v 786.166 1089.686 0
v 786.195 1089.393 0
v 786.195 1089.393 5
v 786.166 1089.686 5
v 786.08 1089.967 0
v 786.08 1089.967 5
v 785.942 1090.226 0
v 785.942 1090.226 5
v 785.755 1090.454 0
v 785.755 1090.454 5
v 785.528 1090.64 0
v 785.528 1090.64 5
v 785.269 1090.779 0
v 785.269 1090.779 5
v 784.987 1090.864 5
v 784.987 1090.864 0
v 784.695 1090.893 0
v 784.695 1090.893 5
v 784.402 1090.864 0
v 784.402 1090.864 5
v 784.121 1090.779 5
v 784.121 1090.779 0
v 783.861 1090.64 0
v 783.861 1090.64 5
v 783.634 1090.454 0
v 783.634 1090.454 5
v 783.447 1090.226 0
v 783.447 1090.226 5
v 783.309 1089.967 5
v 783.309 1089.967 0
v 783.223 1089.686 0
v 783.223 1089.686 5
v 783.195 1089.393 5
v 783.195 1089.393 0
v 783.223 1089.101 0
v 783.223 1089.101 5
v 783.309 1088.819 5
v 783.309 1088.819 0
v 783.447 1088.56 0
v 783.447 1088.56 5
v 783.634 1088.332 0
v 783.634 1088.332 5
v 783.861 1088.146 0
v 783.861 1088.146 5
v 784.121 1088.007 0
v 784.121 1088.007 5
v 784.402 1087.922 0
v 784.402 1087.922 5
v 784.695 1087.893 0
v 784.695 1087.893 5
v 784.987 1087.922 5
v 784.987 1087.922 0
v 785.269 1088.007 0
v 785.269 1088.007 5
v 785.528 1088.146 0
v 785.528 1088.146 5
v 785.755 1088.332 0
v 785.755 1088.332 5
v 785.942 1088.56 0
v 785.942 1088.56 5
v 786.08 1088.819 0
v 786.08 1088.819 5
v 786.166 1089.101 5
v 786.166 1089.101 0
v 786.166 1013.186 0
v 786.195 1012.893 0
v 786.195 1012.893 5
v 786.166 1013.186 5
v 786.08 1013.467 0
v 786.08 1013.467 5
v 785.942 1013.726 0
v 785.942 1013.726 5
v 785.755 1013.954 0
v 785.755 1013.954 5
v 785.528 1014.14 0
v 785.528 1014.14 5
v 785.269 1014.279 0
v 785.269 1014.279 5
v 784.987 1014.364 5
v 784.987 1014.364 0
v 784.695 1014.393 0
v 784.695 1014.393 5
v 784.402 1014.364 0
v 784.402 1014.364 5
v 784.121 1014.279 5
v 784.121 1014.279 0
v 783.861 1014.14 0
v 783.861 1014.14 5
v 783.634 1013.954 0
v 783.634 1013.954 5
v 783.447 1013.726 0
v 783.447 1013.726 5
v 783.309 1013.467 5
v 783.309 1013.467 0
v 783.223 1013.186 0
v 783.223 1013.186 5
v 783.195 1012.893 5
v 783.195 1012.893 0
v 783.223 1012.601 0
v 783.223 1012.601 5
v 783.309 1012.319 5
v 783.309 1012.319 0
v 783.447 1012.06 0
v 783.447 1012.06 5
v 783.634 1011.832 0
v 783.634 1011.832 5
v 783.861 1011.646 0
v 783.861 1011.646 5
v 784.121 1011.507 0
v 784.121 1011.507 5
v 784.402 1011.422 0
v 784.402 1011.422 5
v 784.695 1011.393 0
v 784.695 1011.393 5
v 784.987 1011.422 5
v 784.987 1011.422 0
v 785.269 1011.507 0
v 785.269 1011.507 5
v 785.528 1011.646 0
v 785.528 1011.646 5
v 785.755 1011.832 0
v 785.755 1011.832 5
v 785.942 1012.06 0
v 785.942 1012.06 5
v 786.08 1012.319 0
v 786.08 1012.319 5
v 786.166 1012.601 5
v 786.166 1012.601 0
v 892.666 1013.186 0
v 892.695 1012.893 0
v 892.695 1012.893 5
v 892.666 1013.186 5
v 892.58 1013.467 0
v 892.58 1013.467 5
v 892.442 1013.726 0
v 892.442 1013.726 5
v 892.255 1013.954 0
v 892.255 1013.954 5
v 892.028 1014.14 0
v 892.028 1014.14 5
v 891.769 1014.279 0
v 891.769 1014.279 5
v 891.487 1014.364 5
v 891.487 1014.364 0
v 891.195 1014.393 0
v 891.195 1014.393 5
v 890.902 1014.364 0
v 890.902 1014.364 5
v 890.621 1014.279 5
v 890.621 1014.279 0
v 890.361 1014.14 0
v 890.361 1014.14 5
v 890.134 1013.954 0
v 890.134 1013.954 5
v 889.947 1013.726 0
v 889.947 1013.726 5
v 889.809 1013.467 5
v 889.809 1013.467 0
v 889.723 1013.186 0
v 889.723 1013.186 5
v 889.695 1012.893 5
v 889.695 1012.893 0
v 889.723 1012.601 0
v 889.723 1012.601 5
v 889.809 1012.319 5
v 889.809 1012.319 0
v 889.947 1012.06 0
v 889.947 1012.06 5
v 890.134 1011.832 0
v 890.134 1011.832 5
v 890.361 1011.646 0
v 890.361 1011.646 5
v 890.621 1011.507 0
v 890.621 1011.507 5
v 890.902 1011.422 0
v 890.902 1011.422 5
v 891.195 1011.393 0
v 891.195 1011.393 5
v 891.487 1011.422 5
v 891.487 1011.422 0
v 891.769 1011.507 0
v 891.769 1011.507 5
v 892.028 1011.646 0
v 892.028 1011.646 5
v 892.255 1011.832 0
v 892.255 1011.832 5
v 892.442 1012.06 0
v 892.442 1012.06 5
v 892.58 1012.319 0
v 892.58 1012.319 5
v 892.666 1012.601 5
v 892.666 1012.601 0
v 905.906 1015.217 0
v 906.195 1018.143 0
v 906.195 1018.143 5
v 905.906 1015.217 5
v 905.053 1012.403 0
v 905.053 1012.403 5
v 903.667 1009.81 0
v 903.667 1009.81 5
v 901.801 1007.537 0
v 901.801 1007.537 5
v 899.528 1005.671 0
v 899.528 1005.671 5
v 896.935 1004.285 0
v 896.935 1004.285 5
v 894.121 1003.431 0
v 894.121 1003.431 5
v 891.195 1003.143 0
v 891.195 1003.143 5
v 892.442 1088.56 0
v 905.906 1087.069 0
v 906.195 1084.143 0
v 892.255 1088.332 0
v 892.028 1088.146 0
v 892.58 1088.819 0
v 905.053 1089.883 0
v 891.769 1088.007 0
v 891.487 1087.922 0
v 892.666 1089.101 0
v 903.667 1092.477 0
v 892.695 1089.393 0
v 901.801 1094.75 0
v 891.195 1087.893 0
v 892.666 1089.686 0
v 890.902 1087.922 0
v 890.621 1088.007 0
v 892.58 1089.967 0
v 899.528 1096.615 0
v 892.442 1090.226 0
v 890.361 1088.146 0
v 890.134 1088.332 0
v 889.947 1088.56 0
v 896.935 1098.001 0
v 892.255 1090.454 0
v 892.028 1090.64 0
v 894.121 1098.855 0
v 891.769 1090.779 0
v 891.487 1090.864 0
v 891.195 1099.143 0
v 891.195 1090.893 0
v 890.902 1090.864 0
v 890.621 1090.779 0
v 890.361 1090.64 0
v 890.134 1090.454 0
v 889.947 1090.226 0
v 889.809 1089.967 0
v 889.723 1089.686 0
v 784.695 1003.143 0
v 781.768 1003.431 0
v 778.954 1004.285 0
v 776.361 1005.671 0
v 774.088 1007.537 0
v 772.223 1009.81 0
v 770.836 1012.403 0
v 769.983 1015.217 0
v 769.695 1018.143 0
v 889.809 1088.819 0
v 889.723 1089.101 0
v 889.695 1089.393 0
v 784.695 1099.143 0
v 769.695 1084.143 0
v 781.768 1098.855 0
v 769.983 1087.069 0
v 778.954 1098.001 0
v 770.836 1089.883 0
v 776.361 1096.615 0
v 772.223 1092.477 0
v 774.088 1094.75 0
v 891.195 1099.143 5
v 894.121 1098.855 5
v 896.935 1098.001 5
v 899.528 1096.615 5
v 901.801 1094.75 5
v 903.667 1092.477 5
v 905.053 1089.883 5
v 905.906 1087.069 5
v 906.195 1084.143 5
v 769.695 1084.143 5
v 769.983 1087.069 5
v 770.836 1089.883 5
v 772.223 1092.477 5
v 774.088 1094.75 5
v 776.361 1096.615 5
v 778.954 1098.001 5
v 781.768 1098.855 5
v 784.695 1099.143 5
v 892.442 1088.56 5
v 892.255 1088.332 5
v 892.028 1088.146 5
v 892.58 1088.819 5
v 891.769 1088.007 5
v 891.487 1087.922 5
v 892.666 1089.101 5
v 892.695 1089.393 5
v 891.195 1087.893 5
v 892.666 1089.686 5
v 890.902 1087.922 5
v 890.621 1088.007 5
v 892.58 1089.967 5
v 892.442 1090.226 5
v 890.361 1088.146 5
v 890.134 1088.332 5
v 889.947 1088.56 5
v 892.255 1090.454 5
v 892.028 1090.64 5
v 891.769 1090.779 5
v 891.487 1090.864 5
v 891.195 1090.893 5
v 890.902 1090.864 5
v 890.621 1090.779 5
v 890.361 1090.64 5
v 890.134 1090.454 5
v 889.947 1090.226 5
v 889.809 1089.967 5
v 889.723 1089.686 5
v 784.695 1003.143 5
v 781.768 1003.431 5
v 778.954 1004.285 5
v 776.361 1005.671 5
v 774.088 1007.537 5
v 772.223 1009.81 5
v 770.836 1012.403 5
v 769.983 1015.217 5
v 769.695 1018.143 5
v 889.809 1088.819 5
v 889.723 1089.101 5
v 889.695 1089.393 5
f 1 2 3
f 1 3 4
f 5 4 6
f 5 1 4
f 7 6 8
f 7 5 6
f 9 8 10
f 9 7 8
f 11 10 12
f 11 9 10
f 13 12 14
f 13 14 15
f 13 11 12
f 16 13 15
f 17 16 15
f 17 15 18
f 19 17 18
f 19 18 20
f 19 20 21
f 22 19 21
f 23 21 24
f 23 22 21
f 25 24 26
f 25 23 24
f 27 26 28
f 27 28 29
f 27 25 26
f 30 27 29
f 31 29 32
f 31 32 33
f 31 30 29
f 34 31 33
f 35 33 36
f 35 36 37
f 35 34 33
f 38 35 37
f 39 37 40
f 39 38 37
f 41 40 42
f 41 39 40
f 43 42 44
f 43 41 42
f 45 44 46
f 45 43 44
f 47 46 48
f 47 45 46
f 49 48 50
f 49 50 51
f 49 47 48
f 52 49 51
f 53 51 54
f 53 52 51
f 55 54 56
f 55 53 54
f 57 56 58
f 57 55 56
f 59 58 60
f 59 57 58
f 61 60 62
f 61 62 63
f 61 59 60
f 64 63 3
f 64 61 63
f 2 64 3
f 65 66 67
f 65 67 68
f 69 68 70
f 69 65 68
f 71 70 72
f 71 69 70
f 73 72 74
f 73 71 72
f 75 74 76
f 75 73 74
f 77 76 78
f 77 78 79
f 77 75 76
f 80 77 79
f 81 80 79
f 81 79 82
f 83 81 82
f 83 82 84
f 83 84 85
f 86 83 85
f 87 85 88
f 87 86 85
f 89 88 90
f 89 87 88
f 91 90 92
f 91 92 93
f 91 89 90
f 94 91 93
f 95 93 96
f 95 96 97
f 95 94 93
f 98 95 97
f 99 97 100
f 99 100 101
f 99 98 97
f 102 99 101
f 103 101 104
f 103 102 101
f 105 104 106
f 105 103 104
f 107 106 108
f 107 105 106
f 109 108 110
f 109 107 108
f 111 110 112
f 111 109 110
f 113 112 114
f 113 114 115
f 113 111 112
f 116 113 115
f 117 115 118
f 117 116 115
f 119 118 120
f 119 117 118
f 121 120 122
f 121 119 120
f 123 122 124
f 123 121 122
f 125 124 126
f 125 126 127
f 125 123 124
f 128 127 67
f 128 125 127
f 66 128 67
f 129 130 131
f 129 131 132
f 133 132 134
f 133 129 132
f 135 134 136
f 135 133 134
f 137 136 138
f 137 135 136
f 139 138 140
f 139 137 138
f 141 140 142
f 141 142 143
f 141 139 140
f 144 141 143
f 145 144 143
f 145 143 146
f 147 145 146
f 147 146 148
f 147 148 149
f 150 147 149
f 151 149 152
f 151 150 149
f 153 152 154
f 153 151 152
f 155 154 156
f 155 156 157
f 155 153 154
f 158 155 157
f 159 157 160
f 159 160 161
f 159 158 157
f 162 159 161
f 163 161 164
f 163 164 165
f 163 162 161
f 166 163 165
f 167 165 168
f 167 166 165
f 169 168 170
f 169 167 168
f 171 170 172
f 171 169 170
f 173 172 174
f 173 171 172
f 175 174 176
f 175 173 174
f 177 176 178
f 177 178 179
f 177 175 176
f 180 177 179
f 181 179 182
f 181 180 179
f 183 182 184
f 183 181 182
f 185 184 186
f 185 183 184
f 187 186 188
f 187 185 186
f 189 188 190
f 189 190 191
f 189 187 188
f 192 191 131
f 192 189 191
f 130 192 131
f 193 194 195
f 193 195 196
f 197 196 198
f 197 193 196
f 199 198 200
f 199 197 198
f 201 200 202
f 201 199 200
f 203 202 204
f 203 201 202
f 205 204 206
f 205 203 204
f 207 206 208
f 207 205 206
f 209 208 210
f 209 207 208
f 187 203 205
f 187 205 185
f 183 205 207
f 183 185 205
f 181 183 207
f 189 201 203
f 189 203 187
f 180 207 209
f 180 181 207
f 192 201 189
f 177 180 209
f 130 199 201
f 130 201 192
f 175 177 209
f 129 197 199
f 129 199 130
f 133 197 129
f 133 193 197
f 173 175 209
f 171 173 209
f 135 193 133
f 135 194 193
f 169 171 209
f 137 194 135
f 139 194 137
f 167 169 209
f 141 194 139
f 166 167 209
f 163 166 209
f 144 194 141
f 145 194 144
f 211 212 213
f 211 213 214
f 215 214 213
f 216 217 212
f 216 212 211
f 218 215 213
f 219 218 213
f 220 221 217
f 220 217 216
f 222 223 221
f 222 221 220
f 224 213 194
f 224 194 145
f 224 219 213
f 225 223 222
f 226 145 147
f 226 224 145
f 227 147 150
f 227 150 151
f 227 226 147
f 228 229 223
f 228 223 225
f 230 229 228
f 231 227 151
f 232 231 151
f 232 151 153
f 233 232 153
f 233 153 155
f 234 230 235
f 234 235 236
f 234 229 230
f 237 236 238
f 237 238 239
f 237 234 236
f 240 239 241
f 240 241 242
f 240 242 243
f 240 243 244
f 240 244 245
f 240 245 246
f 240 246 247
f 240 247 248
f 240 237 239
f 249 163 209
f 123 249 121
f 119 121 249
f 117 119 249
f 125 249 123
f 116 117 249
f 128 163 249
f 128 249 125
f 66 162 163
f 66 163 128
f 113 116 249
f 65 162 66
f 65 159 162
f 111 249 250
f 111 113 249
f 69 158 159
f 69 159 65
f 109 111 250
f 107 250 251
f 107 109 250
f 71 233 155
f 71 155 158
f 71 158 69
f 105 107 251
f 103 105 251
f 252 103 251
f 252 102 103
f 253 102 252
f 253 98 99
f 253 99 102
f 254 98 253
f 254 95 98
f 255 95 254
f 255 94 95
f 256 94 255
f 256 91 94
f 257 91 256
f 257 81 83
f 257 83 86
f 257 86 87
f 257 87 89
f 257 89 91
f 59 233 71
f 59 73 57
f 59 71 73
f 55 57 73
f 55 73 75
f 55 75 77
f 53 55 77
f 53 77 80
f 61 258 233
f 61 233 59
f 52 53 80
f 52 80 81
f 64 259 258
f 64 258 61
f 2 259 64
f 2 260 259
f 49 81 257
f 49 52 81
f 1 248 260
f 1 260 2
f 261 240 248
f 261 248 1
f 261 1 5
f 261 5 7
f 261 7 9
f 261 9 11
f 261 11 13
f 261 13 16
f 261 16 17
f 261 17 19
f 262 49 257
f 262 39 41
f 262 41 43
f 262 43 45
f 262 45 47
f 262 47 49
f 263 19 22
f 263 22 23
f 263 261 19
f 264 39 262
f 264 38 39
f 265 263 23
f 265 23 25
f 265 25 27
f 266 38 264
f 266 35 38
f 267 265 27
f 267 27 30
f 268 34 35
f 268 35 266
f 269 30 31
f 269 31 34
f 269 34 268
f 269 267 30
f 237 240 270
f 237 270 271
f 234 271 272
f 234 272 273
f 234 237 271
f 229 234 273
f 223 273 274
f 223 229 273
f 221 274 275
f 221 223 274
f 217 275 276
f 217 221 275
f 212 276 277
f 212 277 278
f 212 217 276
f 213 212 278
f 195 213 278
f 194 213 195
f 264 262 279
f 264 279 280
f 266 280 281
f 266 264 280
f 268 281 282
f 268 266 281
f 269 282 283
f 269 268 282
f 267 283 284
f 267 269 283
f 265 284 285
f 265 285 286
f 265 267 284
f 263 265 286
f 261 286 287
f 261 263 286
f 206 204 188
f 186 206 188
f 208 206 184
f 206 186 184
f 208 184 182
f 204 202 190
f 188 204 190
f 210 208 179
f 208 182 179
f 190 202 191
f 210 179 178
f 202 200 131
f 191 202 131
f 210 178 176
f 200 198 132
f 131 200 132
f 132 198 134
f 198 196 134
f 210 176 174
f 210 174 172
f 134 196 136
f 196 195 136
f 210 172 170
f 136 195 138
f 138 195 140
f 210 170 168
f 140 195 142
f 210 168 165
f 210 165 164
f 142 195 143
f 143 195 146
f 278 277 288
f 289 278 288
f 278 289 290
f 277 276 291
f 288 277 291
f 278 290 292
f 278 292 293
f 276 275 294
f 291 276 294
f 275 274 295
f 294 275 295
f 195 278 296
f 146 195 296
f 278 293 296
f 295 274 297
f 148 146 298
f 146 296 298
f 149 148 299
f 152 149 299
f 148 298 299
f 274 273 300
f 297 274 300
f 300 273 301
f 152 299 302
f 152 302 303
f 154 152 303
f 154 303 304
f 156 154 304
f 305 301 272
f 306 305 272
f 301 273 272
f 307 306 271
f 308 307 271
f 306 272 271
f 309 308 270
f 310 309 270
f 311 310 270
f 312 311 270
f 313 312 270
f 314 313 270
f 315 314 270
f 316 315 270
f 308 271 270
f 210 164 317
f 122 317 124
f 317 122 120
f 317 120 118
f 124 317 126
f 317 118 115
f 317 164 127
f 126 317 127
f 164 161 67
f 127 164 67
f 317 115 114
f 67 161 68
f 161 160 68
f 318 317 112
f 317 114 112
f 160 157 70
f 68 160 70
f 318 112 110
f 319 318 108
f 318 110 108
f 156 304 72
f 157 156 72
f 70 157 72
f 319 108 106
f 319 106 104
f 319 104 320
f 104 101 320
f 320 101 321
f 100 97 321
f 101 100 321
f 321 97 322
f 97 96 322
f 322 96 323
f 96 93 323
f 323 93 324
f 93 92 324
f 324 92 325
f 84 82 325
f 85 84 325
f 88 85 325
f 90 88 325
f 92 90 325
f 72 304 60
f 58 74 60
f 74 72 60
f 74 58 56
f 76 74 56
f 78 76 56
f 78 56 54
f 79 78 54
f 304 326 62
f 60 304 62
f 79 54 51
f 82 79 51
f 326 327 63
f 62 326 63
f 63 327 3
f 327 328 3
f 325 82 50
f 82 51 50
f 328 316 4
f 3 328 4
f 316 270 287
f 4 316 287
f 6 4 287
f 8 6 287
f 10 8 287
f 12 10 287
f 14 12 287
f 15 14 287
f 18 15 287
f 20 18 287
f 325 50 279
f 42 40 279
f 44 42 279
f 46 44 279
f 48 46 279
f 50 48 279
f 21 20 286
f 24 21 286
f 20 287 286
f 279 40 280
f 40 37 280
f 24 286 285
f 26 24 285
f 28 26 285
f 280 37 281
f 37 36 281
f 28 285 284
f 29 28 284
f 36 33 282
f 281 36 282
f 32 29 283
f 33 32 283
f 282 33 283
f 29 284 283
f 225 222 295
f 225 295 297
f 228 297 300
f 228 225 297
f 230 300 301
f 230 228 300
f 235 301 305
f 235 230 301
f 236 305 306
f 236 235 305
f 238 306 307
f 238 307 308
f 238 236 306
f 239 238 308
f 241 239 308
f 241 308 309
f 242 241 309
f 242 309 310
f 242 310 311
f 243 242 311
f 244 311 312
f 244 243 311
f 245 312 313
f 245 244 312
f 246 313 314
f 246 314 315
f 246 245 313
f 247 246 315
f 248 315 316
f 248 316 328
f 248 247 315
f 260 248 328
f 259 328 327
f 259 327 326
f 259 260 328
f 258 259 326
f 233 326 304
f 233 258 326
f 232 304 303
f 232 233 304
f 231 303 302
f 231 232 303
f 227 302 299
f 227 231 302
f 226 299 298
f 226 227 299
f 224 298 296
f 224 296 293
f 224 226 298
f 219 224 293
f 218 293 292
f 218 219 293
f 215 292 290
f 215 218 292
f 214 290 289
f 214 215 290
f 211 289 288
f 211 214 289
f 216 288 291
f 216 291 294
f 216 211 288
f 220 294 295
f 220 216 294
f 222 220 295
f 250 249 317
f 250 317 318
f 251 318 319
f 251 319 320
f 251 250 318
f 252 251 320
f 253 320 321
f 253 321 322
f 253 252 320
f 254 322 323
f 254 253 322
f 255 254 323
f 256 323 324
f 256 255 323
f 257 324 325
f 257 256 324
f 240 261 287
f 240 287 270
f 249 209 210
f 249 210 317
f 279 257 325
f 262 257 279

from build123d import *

# Parameters (mm, degrees)
SKETCH2_R           = 1.5
BOSS_EXTRUDE1_DEPTH = 5


with BuildPart() as part:
    # Sketch2 → Boss-Extrude1 (new body)
    with BuildSketch(Plane.XY):
        with BuildLine():
            Line((792.944636851, 1099.1431403), (882.944636851, 1099.1431403))
            Line((882.944636851, 1099.1431403), (891.194636851, 1099.1431403))
            ThreePointArc((891.194636851, 1099.1431403), (901.801238569, 1094.749742018), (906.194636851, 1084.1431403))
            Line((906.194636851, 1084.1431403), (906.194636851, 1018.1431403))
            ThreePointArc((906.194636851, 1018.1431403), (901.801238569, 1007.536538582), (891.194636851, 1003.1431403))
            Line((891.194636851, 1003.1431403), (784.694636851, 1003.1431403))
            ThreePointArc((784.694636851, 1003.1431403), (774.088035133, 1007.536538582), (769.694636851, 1018.1431403))
            Line((769.694636851, 1018.1431403), (769.694636851, 1084.1431403))
            ThreePointArc((769.694636851, 1084.1431403), (774.088035133, 1094.749742018), (784.694636851, 1099.1431403))
            Line((784.694636851, 1099.1431403), (792.944636851, 1099.1431403))
        make_face()
        with Locations((784.694636851, 1089.3931403)):
            Circle(SKETCH2_R, mode=Mode.SUBTRACT)
        with Locations((784.694636851, 1012.8931403)):
            Circle(SKETCH2_R, mode=Mode.SUBTRACT)
        with Locations((891.194636851, 1012.8931403)):
            Circle(SKETCH2_R, mode=Mode.SUBTRACT)
        with Locations((891.194636851, 1089.3931403)):
            Circle(SKETCH2_R, mode=Mode.SUBTRACT)
    extrude(amount=BOSS_EXTRUDE1_DEPTH)


solid = part.part
